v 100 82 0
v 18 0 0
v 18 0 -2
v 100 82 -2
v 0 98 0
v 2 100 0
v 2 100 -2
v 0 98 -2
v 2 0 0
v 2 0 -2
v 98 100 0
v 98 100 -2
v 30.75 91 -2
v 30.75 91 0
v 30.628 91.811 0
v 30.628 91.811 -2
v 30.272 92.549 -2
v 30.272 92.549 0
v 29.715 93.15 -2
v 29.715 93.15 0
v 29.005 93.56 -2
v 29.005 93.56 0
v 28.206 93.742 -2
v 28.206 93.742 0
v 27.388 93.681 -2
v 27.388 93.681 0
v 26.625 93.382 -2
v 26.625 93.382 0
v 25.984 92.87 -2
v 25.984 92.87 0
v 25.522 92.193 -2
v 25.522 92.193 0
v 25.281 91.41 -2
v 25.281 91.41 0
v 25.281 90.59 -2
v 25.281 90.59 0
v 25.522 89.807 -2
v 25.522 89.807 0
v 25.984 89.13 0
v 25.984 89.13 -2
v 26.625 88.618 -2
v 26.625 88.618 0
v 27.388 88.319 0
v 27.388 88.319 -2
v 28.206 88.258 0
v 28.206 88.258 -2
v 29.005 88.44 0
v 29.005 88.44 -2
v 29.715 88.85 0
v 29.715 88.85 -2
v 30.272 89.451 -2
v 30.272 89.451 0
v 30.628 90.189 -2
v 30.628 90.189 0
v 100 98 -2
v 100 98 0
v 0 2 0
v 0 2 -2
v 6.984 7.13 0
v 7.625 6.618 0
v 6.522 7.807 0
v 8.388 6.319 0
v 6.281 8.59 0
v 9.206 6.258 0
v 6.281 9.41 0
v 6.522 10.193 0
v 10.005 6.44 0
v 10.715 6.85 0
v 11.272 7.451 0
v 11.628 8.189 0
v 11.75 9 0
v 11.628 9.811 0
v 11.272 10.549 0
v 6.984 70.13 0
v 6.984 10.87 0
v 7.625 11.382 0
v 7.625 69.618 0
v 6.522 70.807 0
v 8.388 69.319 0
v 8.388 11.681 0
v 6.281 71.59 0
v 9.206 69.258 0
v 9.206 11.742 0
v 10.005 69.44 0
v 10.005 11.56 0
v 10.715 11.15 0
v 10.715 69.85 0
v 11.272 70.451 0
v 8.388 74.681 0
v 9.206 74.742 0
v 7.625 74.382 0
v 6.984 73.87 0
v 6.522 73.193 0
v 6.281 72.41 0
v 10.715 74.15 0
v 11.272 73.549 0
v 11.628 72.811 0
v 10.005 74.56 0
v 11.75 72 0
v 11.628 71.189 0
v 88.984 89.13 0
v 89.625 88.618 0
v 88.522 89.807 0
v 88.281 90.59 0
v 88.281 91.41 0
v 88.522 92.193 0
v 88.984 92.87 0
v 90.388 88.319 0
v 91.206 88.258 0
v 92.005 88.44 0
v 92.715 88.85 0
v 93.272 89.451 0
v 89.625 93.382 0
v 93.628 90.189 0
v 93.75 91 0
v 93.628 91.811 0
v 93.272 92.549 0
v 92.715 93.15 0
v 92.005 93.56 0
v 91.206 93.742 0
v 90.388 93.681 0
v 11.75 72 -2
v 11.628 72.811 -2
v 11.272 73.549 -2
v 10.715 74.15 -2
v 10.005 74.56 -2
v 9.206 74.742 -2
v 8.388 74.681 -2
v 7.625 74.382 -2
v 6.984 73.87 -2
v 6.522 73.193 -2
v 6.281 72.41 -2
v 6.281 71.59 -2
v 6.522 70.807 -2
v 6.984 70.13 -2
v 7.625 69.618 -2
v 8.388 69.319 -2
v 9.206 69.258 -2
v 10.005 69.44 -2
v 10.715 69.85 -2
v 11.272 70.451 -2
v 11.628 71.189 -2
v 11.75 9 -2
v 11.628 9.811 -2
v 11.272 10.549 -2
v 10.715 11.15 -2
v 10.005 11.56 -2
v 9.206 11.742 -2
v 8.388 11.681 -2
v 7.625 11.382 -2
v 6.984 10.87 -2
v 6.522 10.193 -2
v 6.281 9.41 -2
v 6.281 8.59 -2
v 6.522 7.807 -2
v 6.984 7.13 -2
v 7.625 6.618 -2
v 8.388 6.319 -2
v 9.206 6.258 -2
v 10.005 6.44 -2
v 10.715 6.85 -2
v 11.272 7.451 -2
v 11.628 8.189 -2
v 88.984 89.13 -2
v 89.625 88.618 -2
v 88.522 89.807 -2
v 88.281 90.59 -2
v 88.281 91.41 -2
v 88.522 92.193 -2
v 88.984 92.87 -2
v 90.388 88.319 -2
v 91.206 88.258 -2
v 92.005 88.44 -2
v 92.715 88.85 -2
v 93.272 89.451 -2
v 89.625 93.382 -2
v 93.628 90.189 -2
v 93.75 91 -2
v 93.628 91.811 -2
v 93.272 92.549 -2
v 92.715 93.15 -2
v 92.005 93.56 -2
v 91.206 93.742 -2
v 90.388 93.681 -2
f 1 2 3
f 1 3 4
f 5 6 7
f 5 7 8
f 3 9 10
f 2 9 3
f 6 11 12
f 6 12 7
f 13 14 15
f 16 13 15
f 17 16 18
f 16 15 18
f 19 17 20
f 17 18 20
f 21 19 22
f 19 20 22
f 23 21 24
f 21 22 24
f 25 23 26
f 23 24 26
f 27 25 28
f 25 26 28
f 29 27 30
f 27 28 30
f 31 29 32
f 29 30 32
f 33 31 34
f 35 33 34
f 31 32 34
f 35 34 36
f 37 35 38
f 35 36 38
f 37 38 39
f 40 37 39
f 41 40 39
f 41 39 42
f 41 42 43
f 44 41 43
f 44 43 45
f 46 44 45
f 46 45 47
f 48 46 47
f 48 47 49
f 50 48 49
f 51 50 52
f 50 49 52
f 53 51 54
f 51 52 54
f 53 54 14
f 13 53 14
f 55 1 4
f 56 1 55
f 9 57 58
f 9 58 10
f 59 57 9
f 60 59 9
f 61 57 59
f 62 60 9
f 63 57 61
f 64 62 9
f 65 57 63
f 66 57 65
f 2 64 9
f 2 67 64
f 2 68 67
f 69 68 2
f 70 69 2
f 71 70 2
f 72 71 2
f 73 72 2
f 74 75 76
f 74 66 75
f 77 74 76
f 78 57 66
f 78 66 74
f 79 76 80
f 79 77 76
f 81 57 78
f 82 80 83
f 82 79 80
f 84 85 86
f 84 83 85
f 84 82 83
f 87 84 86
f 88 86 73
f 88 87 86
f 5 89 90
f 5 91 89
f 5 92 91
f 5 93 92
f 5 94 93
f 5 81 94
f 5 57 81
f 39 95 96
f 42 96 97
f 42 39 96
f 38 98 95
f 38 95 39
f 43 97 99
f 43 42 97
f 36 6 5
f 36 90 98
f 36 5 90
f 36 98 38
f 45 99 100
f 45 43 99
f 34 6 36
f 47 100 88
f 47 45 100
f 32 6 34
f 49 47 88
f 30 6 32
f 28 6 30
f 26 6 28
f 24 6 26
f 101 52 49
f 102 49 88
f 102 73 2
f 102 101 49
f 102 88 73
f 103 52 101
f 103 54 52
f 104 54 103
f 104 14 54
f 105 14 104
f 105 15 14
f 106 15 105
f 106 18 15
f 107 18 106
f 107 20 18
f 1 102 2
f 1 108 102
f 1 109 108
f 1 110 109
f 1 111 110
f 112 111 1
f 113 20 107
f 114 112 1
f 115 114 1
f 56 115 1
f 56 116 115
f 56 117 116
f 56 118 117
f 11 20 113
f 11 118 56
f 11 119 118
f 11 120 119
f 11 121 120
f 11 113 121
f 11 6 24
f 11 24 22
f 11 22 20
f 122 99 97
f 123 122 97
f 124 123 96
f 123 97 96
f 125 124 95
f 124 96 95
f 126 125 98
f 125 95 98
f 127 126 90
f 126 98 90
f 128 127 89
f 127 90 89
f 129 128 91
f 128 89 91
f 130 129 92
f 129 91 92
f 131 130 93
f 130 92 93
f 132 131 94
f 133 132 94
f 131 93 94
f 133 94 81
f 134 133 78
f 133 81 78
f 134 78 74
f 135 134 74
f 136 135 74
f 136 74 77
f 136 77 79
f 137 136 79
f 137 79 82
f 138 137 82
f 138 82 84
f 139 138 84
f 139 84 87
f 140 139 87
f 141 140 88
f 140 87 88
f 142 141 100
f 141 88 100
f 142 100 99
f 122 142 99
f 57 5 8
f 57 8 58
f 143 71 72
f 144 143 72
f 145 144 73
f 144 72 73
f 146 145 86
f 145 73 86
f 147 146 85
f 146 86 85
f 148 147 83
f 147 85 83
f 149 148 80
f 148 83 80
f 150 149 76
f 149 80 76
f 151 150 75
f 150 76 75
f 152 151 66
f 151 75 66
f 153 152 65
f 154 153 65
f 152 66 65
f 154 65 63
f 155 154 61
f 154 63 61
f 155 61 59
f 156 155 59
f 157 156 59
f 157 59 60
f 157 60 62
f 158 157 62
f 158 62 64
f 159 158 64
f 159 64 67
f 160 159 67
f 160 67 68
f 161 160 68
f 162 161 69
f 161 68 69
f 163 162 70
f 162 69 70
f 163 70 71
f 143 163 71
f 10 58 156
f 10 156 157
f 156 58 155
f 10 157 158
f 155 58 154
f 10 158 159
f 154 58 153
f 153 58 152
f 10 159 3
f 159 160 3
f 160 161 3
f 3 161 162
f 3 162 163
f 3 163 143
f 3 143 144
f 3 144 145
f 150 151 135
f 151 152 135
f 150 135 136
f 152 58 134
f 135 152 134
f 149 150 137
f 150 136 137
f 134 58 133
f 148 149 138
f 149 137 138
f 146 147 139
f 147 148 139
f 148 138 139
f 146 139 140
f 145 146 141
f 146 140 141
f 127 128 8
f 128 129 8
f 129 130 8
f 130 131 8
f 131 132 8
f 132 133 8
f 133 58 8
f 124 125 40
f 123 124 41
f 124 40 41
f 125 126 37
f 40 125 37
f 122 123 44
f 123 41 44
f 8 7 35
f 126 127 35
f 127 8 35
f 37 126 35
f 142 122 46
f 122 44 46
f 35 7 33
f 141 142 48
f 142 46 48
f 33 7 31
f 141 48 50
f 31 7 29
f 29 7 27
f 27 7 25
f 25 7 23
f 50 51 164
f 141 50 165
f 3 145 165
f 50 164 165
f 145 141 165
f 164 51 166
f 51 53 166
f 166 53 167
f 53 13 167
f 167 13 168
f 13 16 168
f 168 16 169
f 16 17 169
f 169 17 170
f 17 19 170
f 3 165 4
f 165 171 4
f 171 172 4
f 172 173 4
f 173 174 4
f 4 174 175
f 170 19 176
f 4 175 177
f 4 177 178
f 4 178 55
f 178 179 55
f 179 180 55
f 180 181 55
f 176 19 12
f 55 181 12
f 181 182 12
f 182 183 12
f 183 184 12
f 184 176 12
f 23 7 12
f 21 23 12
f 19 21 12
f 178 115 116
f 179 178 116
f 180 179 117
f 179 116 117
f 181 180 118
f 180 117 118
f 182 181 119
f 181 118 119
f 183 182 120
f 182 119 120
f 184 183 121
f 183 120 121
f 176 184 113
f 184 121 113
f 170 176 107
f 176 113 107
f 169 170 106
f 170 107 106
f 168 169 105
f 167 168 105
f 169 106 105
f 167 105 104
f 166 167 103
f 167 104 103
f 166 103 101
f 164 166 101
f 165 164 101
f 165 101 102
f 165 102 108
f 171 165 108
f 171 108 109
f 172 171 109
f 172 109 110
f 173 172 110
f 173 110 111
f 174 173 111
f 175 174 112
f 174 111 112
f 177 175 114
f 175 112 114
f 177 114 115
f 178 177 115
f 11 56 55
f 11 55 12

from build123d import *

# Parameters (mm, degrees)
SKETCH1_R           = 2.75
BOSS_EXTRUDE1_DEPTH = 2


with BuildPart() as part:
    # Sketch1 → Boss-Extrude1 (new body)
    with BuildSketch(Plane.XY):
        Polygon((0, 98), (0, 2), (2, 0), (18, 0), (100, 82), (100, 98), (98, 100), (2, 100), align=None)
        with Locations((91, 91)):
            Circle(SKETCH1_R, mode=Mode.SUBTRACT)
        with Locations((28, 91)):
            Circle(SKETCH1_R, mode=Mode.SUBTRACT)
        with Locations((9, 9)):
            Circle(SKETCH1_R, mode=Mode.SUBTRACT)
        with Locations((9, 72)):
            Circle(SKETCH1_R, mode=Mode.SUBTRACT)
    extrude(amount=-BOSS_EXTRUDE1_DEPTH)


solid = part.part
